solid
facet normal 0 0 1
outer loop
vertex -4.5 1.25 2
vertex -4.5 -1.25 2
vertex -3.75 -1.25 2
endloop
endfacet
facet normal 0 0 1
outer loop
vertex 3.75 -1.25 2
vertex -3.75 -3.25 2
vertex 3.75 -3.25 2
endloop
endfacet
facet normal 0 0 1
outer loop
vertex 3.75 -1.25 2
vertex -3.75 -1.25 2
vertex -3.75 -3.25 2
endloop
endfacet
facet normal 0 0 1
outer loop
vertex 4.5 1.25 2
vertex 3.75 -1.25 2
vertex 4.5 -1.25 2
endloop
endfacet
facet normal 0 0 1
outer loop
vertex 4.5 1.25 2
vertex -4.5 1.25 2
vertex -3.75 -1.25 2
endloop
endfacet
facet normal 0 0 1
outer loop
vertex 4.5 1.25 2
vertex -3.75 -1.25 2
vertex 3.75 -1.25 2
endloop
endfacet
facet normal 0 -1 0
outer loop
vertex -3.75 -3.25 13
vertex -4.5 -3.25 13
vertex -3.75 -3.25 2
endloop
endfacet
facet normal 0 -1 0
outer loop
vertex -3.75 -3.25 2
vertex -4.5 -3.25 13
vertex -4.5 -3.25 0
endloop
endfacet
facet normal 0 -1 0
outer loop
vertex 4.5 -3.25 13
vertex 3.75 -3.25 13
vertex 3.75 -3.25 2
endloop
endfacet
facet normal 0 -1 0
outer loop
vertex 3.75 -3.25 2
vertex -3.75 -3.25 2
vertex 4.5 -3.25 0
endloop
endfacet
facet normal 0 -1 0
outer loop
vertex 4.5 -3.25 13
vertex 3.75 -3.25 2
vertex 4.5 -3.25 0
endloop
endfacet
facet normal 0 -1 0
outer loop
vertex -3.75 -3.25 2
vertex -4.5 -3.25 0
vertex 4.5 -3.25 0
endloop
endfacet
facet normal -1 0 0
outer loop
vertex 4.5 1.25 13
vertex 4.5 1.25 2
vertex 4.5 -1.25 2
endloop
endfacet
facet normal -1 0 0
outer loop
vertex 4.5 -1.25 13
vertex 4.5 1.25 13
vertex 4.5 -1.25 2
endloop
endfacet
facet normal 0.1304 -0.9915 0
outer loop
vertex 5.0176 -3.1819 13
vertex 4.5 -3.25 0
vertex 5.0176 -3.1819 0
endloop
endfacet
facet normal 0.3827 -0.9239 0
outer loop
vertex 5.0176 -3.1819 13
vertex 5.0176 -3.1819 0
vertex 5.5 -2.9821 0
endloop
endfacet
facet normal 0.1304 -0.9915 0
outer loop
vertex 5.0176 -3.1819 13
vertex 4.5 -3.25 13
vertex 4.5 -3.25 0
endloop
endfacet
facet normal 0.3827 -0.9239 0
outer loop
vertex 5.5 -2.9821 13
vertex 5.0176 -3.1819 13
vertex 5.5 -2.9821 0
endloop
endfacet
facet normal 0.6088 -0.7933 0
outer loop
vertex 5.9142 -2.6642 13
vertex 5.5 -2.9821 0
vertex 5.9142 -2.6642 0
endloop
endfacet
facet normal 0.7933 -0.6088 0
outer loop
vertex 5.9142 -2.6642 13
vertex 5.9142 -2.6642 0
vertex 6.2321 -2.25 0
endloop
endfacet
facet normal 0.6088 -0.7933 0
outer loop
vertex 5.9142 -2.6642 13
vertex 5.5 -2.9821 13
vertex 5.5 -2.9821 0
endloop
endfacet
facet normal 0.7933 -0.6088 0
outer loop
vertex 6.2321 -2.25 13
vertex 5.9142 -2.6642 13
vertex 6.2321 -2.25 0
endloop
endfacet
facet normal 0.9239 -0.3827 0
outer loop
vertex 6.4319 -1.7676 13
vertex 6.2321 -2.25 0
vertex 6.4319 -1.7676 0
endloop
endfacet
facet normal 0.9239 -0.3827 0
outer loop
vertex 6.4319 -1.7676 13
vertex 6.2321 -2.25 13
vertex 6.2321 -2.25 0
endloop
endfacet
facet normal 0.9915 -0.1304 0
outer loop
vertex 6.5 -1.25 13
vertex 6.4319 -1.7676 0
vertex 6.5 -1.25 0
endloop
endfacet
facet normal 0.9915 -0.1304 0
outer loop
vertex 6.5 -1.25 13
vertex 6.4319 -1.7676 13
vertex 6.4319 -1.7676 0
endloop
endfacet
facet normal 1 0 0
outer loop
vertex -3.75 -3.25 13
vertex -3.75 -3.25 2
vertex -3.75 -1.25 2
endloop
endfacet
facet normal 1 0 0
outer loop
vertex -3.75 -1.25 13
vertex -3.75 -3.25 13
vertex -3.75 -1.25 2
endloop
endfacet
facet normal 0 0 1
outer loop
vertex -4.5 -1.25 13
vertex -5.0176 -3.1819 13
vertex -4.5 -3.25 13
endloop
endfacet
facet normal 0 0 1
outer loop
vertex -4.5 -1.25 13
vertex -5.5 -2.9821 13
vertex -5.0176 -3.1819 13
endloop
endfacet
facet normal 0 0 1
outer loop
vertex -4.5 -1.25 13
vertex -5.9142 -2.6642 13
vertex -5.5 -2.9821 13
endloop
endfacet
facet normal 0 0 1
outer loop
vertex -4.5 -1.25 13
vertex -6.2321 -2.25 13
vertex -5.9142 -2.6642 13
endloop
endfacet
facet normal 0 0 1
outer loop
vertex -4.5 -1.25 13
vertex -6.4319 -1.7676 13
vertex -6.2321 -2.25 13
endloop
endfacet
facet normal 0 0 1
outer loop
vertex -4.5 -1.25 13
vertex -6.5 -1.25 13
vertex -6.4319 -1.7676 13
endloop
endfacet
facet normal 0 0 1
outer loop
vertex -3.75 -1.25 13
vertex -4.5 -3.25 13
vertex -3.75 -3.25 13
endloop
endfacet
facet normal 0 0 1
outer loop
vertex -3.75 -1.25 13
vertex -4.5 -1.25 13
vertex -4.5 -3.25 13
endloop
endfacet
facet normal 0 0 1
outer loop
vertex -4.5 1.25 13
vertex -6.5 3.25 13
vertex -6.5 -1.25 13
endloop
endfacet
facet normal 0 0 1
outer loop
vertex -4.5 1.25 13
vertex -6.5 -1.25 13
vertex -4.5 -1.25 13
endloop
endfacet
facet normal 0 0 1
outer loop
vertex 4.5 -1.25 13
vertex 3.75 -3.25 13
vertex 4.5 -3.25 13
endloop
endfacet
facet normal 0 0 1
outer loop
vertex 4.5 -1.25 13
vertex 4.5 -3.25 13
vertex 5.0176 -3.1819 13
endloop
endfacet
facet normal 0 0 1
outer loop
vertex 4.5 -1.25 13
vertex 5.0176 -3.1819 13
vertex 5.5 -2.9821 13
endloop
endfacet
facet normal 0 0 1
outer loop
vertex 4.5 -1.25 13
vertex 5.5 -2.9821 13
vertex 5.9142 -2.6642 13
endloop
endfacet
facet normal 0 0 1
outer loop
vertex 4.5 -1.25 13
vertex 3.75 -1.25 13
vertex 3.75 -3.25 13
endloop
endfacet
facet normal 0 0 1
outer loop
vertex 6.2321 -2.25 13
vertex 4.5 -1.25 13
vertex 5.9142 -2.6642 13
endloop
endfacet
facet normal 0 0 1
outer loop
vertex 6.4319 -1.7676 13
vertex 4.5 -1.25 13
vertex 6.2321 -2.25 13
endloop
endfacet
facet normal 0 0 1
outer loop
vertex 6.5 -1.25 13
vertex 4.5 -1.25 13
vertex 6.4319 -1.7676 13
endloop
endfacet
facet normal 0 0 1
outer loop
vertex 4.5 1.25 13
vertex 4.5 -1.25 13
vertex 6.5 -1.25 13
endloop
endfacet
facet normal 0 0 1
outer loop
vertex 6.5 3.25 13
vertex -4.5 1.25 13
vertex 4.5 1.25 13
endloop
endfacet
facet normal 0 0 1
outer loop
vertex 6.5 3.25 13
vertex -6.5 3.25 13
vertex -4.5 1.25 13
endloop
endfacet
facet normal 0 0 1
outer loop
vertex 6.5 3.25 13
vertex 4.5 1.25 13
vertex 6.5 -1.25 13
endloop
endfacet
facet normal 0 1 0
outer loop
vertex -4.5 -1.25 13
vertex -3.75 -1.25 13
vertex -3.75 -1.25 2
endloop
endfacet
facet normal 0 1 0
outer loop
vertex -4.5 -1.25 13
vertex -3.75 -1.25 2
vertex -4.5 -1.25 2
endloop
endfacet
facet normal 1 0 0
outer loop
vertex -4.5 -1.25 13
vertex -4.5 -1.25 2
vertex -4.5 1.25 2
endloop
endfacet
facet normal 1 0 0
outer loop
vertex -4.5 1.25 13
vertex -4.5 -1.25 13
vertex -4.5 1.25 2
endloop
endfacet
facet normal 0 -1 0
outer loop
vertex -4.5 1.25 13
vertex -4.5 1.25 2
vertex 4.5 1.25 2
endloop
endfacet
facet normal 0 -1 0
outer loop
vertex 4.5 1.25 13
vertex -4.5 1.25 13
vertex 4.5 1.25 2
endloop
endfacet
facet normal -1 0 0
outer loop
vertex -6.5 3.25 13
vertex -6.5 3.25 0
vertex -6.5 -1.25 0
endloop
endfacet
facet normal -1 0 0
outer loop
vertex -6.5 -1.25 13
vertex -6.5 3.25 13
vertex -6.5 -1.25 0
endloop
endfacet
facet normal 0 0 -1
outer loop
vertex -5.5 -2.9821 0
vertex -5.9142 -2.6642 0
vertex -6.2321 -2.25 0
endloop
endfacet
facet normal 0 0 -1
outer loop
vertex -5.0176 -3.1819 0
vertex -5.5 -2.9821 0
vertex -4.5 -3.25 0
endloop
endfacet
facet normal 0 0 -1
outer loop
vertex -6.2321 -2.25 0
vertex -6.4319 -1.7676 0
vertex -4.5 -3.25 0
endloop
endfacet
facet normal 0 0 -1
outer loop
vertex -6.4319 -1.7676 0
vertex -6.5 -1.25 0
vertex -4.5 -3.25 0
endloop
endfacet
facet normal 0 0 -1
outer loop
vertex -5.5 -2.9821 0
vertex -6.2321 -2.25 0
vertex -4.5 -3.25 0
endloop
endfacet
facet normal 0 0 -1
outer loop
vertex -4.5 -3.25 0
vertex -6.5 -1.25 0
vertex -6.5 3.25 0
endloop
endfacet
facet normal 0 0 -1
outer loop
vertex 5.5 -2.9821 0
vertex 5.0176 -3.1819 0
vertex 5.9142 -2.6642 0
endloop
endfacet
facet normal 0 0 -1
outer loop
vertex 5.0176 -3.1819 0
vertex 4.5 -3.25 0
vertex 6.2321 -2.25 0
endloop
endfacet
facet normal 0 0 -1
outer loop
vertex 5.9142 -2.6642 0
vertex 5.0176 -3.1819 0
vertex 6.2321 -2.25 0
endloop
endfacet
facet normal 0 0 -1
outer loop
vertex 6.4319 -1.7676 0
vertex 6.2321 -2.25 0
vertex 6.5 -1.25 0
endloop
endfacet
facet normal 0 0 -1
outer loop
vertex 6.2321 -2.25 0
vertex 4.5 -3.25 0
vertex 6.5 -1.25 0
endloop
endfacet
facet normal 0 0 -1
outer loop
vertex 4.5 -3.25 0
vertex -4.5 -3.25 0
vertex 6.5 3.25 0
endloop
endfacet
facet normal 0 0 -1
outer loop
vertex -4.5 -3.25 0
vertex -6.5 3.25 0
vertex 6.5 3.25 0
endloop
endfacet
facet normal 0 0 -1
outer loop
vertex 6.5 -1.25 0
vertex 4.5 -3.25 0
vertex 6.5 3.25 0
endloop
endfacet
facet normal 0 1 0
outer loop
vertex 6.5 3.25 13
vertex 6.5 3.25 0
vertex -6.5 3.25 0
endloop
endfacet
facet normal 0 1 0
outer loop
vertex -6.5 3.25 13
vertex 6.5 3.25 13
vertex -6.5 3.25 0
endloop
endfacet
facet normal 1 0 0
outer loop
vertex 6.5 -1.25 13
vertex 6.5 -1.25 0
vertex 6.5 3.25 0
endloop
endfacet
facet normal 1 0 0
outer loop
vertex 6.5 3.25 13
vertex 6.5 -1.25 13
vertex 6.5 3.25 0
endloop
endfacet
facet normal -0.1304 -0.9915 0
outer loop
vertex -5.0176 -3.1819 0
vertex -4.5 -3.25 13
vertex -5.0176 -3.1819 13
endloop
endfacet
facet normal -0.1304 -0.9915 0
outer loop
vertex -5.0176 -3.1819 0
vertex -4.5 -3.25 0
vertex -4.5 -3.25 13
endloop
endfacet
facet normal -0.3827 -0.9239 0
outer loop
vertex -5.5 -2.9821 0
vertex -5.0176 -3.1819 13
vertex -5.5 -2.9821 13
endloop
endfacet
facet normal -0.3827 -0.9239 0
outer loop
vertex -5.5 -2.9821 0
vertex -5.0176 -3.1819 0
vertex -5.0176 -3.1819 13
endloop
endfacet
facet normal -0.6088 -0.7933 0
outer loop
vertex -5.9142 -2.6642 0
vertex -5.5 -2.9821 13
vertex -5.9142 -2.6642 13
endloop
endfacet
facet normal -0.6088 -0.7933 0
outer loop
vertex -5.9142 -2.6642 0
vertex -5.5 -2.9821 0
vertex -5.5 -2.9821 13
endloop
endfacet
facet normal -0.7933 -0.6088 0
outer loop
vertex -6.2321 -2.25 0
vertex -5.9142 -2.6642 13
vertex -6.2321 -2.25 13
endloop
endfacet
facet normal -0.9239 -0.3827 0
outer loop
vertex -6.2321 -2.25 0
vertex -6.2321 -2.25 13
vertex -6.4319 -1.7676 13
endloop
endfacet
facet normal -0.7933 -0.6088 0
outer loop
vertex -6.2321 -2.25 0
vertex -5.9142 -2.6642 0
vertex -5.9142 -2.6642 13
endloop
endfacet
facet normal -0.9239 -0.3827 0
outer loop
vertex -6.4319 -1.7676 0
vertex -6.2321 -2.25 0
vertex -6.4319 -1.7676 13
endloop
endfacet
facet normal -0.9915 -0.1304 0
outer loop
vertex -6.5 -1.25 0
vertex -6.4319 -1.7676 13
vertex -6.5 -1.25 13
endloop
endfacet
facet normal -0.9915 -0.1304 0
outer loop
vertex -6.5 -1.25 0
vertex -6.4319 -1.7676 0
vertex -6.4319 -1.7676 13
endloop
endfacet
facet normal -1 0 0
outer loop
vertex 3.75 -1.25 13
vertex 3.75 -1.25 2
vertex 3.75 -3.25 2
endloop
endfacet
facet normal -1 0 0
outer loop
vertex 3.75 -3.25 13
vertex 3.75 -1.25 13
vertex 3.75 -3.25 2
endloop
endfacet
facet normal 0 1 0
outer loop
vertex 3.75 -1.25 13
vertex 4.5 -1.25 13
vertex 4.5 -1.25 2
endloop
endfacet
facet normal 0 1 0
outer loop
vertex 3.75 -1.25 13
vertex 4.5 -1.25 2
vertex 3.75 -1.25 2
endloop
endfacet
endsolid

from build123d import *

# Parameters (mm, degrees)
F1_DEPTH = 13
F0_W     = 7.5
F0_H     = 2
F2_DEPTH = 2
F3_R     = 2


with BuildPart() as f1:
    # F0 (on Top) → F1 (new body)
    with BuildSketch(Plane.XY):
        Polygon((3.75, -3.25), (6.5, -3.25), (6.5, 3.25), (-6.5, 3.25), (-6.5, -3.25), (-3.75, -3.25), (-3.75, -1.25), (-4.5, -1.25), (-4.5, 1.25), (4.5, 1.25), (4.5, -1.25), (3.75, -1.25), align=None)
    extrude(amount=F1_DEPTH)

    # F0 (on Top) → F2 (join)
    with BuildSketch(Plane.XY):
        Polygon((3.75, -3.25), (6.5, -3.25), (6.5, 3.25), (-6.5, 3.25), (-6.5, -3.25), (-3.75, -3.25), (-3.75, -1.25), (-4.5, -1.25), (-4.5, 1.25), (4.5, 1.25), (4.5, -1.25), (3.75, -1.25), align=None)
        Polygon((-3.75, -1.25), (3.75, -1.25), (4.5, -1.25), (4.5, 1.25), (-4.5, 1.25), (-4.5, -1.25), align=None)
        with Locations((0, -2.25)):
            Rectangle(F0_W, F0_H)
    extrude(amount=F2_DEPTH)

    # F3
    f3_edges = [f1.edges().sort_by_distance(p)[0] for p in [
        (-6.5, -3.25, 6.5),
        (6.5, -3.25, 6.5),
    ]]
    fillet(f3_edges, radius=F3_R)


solid = f1.part
